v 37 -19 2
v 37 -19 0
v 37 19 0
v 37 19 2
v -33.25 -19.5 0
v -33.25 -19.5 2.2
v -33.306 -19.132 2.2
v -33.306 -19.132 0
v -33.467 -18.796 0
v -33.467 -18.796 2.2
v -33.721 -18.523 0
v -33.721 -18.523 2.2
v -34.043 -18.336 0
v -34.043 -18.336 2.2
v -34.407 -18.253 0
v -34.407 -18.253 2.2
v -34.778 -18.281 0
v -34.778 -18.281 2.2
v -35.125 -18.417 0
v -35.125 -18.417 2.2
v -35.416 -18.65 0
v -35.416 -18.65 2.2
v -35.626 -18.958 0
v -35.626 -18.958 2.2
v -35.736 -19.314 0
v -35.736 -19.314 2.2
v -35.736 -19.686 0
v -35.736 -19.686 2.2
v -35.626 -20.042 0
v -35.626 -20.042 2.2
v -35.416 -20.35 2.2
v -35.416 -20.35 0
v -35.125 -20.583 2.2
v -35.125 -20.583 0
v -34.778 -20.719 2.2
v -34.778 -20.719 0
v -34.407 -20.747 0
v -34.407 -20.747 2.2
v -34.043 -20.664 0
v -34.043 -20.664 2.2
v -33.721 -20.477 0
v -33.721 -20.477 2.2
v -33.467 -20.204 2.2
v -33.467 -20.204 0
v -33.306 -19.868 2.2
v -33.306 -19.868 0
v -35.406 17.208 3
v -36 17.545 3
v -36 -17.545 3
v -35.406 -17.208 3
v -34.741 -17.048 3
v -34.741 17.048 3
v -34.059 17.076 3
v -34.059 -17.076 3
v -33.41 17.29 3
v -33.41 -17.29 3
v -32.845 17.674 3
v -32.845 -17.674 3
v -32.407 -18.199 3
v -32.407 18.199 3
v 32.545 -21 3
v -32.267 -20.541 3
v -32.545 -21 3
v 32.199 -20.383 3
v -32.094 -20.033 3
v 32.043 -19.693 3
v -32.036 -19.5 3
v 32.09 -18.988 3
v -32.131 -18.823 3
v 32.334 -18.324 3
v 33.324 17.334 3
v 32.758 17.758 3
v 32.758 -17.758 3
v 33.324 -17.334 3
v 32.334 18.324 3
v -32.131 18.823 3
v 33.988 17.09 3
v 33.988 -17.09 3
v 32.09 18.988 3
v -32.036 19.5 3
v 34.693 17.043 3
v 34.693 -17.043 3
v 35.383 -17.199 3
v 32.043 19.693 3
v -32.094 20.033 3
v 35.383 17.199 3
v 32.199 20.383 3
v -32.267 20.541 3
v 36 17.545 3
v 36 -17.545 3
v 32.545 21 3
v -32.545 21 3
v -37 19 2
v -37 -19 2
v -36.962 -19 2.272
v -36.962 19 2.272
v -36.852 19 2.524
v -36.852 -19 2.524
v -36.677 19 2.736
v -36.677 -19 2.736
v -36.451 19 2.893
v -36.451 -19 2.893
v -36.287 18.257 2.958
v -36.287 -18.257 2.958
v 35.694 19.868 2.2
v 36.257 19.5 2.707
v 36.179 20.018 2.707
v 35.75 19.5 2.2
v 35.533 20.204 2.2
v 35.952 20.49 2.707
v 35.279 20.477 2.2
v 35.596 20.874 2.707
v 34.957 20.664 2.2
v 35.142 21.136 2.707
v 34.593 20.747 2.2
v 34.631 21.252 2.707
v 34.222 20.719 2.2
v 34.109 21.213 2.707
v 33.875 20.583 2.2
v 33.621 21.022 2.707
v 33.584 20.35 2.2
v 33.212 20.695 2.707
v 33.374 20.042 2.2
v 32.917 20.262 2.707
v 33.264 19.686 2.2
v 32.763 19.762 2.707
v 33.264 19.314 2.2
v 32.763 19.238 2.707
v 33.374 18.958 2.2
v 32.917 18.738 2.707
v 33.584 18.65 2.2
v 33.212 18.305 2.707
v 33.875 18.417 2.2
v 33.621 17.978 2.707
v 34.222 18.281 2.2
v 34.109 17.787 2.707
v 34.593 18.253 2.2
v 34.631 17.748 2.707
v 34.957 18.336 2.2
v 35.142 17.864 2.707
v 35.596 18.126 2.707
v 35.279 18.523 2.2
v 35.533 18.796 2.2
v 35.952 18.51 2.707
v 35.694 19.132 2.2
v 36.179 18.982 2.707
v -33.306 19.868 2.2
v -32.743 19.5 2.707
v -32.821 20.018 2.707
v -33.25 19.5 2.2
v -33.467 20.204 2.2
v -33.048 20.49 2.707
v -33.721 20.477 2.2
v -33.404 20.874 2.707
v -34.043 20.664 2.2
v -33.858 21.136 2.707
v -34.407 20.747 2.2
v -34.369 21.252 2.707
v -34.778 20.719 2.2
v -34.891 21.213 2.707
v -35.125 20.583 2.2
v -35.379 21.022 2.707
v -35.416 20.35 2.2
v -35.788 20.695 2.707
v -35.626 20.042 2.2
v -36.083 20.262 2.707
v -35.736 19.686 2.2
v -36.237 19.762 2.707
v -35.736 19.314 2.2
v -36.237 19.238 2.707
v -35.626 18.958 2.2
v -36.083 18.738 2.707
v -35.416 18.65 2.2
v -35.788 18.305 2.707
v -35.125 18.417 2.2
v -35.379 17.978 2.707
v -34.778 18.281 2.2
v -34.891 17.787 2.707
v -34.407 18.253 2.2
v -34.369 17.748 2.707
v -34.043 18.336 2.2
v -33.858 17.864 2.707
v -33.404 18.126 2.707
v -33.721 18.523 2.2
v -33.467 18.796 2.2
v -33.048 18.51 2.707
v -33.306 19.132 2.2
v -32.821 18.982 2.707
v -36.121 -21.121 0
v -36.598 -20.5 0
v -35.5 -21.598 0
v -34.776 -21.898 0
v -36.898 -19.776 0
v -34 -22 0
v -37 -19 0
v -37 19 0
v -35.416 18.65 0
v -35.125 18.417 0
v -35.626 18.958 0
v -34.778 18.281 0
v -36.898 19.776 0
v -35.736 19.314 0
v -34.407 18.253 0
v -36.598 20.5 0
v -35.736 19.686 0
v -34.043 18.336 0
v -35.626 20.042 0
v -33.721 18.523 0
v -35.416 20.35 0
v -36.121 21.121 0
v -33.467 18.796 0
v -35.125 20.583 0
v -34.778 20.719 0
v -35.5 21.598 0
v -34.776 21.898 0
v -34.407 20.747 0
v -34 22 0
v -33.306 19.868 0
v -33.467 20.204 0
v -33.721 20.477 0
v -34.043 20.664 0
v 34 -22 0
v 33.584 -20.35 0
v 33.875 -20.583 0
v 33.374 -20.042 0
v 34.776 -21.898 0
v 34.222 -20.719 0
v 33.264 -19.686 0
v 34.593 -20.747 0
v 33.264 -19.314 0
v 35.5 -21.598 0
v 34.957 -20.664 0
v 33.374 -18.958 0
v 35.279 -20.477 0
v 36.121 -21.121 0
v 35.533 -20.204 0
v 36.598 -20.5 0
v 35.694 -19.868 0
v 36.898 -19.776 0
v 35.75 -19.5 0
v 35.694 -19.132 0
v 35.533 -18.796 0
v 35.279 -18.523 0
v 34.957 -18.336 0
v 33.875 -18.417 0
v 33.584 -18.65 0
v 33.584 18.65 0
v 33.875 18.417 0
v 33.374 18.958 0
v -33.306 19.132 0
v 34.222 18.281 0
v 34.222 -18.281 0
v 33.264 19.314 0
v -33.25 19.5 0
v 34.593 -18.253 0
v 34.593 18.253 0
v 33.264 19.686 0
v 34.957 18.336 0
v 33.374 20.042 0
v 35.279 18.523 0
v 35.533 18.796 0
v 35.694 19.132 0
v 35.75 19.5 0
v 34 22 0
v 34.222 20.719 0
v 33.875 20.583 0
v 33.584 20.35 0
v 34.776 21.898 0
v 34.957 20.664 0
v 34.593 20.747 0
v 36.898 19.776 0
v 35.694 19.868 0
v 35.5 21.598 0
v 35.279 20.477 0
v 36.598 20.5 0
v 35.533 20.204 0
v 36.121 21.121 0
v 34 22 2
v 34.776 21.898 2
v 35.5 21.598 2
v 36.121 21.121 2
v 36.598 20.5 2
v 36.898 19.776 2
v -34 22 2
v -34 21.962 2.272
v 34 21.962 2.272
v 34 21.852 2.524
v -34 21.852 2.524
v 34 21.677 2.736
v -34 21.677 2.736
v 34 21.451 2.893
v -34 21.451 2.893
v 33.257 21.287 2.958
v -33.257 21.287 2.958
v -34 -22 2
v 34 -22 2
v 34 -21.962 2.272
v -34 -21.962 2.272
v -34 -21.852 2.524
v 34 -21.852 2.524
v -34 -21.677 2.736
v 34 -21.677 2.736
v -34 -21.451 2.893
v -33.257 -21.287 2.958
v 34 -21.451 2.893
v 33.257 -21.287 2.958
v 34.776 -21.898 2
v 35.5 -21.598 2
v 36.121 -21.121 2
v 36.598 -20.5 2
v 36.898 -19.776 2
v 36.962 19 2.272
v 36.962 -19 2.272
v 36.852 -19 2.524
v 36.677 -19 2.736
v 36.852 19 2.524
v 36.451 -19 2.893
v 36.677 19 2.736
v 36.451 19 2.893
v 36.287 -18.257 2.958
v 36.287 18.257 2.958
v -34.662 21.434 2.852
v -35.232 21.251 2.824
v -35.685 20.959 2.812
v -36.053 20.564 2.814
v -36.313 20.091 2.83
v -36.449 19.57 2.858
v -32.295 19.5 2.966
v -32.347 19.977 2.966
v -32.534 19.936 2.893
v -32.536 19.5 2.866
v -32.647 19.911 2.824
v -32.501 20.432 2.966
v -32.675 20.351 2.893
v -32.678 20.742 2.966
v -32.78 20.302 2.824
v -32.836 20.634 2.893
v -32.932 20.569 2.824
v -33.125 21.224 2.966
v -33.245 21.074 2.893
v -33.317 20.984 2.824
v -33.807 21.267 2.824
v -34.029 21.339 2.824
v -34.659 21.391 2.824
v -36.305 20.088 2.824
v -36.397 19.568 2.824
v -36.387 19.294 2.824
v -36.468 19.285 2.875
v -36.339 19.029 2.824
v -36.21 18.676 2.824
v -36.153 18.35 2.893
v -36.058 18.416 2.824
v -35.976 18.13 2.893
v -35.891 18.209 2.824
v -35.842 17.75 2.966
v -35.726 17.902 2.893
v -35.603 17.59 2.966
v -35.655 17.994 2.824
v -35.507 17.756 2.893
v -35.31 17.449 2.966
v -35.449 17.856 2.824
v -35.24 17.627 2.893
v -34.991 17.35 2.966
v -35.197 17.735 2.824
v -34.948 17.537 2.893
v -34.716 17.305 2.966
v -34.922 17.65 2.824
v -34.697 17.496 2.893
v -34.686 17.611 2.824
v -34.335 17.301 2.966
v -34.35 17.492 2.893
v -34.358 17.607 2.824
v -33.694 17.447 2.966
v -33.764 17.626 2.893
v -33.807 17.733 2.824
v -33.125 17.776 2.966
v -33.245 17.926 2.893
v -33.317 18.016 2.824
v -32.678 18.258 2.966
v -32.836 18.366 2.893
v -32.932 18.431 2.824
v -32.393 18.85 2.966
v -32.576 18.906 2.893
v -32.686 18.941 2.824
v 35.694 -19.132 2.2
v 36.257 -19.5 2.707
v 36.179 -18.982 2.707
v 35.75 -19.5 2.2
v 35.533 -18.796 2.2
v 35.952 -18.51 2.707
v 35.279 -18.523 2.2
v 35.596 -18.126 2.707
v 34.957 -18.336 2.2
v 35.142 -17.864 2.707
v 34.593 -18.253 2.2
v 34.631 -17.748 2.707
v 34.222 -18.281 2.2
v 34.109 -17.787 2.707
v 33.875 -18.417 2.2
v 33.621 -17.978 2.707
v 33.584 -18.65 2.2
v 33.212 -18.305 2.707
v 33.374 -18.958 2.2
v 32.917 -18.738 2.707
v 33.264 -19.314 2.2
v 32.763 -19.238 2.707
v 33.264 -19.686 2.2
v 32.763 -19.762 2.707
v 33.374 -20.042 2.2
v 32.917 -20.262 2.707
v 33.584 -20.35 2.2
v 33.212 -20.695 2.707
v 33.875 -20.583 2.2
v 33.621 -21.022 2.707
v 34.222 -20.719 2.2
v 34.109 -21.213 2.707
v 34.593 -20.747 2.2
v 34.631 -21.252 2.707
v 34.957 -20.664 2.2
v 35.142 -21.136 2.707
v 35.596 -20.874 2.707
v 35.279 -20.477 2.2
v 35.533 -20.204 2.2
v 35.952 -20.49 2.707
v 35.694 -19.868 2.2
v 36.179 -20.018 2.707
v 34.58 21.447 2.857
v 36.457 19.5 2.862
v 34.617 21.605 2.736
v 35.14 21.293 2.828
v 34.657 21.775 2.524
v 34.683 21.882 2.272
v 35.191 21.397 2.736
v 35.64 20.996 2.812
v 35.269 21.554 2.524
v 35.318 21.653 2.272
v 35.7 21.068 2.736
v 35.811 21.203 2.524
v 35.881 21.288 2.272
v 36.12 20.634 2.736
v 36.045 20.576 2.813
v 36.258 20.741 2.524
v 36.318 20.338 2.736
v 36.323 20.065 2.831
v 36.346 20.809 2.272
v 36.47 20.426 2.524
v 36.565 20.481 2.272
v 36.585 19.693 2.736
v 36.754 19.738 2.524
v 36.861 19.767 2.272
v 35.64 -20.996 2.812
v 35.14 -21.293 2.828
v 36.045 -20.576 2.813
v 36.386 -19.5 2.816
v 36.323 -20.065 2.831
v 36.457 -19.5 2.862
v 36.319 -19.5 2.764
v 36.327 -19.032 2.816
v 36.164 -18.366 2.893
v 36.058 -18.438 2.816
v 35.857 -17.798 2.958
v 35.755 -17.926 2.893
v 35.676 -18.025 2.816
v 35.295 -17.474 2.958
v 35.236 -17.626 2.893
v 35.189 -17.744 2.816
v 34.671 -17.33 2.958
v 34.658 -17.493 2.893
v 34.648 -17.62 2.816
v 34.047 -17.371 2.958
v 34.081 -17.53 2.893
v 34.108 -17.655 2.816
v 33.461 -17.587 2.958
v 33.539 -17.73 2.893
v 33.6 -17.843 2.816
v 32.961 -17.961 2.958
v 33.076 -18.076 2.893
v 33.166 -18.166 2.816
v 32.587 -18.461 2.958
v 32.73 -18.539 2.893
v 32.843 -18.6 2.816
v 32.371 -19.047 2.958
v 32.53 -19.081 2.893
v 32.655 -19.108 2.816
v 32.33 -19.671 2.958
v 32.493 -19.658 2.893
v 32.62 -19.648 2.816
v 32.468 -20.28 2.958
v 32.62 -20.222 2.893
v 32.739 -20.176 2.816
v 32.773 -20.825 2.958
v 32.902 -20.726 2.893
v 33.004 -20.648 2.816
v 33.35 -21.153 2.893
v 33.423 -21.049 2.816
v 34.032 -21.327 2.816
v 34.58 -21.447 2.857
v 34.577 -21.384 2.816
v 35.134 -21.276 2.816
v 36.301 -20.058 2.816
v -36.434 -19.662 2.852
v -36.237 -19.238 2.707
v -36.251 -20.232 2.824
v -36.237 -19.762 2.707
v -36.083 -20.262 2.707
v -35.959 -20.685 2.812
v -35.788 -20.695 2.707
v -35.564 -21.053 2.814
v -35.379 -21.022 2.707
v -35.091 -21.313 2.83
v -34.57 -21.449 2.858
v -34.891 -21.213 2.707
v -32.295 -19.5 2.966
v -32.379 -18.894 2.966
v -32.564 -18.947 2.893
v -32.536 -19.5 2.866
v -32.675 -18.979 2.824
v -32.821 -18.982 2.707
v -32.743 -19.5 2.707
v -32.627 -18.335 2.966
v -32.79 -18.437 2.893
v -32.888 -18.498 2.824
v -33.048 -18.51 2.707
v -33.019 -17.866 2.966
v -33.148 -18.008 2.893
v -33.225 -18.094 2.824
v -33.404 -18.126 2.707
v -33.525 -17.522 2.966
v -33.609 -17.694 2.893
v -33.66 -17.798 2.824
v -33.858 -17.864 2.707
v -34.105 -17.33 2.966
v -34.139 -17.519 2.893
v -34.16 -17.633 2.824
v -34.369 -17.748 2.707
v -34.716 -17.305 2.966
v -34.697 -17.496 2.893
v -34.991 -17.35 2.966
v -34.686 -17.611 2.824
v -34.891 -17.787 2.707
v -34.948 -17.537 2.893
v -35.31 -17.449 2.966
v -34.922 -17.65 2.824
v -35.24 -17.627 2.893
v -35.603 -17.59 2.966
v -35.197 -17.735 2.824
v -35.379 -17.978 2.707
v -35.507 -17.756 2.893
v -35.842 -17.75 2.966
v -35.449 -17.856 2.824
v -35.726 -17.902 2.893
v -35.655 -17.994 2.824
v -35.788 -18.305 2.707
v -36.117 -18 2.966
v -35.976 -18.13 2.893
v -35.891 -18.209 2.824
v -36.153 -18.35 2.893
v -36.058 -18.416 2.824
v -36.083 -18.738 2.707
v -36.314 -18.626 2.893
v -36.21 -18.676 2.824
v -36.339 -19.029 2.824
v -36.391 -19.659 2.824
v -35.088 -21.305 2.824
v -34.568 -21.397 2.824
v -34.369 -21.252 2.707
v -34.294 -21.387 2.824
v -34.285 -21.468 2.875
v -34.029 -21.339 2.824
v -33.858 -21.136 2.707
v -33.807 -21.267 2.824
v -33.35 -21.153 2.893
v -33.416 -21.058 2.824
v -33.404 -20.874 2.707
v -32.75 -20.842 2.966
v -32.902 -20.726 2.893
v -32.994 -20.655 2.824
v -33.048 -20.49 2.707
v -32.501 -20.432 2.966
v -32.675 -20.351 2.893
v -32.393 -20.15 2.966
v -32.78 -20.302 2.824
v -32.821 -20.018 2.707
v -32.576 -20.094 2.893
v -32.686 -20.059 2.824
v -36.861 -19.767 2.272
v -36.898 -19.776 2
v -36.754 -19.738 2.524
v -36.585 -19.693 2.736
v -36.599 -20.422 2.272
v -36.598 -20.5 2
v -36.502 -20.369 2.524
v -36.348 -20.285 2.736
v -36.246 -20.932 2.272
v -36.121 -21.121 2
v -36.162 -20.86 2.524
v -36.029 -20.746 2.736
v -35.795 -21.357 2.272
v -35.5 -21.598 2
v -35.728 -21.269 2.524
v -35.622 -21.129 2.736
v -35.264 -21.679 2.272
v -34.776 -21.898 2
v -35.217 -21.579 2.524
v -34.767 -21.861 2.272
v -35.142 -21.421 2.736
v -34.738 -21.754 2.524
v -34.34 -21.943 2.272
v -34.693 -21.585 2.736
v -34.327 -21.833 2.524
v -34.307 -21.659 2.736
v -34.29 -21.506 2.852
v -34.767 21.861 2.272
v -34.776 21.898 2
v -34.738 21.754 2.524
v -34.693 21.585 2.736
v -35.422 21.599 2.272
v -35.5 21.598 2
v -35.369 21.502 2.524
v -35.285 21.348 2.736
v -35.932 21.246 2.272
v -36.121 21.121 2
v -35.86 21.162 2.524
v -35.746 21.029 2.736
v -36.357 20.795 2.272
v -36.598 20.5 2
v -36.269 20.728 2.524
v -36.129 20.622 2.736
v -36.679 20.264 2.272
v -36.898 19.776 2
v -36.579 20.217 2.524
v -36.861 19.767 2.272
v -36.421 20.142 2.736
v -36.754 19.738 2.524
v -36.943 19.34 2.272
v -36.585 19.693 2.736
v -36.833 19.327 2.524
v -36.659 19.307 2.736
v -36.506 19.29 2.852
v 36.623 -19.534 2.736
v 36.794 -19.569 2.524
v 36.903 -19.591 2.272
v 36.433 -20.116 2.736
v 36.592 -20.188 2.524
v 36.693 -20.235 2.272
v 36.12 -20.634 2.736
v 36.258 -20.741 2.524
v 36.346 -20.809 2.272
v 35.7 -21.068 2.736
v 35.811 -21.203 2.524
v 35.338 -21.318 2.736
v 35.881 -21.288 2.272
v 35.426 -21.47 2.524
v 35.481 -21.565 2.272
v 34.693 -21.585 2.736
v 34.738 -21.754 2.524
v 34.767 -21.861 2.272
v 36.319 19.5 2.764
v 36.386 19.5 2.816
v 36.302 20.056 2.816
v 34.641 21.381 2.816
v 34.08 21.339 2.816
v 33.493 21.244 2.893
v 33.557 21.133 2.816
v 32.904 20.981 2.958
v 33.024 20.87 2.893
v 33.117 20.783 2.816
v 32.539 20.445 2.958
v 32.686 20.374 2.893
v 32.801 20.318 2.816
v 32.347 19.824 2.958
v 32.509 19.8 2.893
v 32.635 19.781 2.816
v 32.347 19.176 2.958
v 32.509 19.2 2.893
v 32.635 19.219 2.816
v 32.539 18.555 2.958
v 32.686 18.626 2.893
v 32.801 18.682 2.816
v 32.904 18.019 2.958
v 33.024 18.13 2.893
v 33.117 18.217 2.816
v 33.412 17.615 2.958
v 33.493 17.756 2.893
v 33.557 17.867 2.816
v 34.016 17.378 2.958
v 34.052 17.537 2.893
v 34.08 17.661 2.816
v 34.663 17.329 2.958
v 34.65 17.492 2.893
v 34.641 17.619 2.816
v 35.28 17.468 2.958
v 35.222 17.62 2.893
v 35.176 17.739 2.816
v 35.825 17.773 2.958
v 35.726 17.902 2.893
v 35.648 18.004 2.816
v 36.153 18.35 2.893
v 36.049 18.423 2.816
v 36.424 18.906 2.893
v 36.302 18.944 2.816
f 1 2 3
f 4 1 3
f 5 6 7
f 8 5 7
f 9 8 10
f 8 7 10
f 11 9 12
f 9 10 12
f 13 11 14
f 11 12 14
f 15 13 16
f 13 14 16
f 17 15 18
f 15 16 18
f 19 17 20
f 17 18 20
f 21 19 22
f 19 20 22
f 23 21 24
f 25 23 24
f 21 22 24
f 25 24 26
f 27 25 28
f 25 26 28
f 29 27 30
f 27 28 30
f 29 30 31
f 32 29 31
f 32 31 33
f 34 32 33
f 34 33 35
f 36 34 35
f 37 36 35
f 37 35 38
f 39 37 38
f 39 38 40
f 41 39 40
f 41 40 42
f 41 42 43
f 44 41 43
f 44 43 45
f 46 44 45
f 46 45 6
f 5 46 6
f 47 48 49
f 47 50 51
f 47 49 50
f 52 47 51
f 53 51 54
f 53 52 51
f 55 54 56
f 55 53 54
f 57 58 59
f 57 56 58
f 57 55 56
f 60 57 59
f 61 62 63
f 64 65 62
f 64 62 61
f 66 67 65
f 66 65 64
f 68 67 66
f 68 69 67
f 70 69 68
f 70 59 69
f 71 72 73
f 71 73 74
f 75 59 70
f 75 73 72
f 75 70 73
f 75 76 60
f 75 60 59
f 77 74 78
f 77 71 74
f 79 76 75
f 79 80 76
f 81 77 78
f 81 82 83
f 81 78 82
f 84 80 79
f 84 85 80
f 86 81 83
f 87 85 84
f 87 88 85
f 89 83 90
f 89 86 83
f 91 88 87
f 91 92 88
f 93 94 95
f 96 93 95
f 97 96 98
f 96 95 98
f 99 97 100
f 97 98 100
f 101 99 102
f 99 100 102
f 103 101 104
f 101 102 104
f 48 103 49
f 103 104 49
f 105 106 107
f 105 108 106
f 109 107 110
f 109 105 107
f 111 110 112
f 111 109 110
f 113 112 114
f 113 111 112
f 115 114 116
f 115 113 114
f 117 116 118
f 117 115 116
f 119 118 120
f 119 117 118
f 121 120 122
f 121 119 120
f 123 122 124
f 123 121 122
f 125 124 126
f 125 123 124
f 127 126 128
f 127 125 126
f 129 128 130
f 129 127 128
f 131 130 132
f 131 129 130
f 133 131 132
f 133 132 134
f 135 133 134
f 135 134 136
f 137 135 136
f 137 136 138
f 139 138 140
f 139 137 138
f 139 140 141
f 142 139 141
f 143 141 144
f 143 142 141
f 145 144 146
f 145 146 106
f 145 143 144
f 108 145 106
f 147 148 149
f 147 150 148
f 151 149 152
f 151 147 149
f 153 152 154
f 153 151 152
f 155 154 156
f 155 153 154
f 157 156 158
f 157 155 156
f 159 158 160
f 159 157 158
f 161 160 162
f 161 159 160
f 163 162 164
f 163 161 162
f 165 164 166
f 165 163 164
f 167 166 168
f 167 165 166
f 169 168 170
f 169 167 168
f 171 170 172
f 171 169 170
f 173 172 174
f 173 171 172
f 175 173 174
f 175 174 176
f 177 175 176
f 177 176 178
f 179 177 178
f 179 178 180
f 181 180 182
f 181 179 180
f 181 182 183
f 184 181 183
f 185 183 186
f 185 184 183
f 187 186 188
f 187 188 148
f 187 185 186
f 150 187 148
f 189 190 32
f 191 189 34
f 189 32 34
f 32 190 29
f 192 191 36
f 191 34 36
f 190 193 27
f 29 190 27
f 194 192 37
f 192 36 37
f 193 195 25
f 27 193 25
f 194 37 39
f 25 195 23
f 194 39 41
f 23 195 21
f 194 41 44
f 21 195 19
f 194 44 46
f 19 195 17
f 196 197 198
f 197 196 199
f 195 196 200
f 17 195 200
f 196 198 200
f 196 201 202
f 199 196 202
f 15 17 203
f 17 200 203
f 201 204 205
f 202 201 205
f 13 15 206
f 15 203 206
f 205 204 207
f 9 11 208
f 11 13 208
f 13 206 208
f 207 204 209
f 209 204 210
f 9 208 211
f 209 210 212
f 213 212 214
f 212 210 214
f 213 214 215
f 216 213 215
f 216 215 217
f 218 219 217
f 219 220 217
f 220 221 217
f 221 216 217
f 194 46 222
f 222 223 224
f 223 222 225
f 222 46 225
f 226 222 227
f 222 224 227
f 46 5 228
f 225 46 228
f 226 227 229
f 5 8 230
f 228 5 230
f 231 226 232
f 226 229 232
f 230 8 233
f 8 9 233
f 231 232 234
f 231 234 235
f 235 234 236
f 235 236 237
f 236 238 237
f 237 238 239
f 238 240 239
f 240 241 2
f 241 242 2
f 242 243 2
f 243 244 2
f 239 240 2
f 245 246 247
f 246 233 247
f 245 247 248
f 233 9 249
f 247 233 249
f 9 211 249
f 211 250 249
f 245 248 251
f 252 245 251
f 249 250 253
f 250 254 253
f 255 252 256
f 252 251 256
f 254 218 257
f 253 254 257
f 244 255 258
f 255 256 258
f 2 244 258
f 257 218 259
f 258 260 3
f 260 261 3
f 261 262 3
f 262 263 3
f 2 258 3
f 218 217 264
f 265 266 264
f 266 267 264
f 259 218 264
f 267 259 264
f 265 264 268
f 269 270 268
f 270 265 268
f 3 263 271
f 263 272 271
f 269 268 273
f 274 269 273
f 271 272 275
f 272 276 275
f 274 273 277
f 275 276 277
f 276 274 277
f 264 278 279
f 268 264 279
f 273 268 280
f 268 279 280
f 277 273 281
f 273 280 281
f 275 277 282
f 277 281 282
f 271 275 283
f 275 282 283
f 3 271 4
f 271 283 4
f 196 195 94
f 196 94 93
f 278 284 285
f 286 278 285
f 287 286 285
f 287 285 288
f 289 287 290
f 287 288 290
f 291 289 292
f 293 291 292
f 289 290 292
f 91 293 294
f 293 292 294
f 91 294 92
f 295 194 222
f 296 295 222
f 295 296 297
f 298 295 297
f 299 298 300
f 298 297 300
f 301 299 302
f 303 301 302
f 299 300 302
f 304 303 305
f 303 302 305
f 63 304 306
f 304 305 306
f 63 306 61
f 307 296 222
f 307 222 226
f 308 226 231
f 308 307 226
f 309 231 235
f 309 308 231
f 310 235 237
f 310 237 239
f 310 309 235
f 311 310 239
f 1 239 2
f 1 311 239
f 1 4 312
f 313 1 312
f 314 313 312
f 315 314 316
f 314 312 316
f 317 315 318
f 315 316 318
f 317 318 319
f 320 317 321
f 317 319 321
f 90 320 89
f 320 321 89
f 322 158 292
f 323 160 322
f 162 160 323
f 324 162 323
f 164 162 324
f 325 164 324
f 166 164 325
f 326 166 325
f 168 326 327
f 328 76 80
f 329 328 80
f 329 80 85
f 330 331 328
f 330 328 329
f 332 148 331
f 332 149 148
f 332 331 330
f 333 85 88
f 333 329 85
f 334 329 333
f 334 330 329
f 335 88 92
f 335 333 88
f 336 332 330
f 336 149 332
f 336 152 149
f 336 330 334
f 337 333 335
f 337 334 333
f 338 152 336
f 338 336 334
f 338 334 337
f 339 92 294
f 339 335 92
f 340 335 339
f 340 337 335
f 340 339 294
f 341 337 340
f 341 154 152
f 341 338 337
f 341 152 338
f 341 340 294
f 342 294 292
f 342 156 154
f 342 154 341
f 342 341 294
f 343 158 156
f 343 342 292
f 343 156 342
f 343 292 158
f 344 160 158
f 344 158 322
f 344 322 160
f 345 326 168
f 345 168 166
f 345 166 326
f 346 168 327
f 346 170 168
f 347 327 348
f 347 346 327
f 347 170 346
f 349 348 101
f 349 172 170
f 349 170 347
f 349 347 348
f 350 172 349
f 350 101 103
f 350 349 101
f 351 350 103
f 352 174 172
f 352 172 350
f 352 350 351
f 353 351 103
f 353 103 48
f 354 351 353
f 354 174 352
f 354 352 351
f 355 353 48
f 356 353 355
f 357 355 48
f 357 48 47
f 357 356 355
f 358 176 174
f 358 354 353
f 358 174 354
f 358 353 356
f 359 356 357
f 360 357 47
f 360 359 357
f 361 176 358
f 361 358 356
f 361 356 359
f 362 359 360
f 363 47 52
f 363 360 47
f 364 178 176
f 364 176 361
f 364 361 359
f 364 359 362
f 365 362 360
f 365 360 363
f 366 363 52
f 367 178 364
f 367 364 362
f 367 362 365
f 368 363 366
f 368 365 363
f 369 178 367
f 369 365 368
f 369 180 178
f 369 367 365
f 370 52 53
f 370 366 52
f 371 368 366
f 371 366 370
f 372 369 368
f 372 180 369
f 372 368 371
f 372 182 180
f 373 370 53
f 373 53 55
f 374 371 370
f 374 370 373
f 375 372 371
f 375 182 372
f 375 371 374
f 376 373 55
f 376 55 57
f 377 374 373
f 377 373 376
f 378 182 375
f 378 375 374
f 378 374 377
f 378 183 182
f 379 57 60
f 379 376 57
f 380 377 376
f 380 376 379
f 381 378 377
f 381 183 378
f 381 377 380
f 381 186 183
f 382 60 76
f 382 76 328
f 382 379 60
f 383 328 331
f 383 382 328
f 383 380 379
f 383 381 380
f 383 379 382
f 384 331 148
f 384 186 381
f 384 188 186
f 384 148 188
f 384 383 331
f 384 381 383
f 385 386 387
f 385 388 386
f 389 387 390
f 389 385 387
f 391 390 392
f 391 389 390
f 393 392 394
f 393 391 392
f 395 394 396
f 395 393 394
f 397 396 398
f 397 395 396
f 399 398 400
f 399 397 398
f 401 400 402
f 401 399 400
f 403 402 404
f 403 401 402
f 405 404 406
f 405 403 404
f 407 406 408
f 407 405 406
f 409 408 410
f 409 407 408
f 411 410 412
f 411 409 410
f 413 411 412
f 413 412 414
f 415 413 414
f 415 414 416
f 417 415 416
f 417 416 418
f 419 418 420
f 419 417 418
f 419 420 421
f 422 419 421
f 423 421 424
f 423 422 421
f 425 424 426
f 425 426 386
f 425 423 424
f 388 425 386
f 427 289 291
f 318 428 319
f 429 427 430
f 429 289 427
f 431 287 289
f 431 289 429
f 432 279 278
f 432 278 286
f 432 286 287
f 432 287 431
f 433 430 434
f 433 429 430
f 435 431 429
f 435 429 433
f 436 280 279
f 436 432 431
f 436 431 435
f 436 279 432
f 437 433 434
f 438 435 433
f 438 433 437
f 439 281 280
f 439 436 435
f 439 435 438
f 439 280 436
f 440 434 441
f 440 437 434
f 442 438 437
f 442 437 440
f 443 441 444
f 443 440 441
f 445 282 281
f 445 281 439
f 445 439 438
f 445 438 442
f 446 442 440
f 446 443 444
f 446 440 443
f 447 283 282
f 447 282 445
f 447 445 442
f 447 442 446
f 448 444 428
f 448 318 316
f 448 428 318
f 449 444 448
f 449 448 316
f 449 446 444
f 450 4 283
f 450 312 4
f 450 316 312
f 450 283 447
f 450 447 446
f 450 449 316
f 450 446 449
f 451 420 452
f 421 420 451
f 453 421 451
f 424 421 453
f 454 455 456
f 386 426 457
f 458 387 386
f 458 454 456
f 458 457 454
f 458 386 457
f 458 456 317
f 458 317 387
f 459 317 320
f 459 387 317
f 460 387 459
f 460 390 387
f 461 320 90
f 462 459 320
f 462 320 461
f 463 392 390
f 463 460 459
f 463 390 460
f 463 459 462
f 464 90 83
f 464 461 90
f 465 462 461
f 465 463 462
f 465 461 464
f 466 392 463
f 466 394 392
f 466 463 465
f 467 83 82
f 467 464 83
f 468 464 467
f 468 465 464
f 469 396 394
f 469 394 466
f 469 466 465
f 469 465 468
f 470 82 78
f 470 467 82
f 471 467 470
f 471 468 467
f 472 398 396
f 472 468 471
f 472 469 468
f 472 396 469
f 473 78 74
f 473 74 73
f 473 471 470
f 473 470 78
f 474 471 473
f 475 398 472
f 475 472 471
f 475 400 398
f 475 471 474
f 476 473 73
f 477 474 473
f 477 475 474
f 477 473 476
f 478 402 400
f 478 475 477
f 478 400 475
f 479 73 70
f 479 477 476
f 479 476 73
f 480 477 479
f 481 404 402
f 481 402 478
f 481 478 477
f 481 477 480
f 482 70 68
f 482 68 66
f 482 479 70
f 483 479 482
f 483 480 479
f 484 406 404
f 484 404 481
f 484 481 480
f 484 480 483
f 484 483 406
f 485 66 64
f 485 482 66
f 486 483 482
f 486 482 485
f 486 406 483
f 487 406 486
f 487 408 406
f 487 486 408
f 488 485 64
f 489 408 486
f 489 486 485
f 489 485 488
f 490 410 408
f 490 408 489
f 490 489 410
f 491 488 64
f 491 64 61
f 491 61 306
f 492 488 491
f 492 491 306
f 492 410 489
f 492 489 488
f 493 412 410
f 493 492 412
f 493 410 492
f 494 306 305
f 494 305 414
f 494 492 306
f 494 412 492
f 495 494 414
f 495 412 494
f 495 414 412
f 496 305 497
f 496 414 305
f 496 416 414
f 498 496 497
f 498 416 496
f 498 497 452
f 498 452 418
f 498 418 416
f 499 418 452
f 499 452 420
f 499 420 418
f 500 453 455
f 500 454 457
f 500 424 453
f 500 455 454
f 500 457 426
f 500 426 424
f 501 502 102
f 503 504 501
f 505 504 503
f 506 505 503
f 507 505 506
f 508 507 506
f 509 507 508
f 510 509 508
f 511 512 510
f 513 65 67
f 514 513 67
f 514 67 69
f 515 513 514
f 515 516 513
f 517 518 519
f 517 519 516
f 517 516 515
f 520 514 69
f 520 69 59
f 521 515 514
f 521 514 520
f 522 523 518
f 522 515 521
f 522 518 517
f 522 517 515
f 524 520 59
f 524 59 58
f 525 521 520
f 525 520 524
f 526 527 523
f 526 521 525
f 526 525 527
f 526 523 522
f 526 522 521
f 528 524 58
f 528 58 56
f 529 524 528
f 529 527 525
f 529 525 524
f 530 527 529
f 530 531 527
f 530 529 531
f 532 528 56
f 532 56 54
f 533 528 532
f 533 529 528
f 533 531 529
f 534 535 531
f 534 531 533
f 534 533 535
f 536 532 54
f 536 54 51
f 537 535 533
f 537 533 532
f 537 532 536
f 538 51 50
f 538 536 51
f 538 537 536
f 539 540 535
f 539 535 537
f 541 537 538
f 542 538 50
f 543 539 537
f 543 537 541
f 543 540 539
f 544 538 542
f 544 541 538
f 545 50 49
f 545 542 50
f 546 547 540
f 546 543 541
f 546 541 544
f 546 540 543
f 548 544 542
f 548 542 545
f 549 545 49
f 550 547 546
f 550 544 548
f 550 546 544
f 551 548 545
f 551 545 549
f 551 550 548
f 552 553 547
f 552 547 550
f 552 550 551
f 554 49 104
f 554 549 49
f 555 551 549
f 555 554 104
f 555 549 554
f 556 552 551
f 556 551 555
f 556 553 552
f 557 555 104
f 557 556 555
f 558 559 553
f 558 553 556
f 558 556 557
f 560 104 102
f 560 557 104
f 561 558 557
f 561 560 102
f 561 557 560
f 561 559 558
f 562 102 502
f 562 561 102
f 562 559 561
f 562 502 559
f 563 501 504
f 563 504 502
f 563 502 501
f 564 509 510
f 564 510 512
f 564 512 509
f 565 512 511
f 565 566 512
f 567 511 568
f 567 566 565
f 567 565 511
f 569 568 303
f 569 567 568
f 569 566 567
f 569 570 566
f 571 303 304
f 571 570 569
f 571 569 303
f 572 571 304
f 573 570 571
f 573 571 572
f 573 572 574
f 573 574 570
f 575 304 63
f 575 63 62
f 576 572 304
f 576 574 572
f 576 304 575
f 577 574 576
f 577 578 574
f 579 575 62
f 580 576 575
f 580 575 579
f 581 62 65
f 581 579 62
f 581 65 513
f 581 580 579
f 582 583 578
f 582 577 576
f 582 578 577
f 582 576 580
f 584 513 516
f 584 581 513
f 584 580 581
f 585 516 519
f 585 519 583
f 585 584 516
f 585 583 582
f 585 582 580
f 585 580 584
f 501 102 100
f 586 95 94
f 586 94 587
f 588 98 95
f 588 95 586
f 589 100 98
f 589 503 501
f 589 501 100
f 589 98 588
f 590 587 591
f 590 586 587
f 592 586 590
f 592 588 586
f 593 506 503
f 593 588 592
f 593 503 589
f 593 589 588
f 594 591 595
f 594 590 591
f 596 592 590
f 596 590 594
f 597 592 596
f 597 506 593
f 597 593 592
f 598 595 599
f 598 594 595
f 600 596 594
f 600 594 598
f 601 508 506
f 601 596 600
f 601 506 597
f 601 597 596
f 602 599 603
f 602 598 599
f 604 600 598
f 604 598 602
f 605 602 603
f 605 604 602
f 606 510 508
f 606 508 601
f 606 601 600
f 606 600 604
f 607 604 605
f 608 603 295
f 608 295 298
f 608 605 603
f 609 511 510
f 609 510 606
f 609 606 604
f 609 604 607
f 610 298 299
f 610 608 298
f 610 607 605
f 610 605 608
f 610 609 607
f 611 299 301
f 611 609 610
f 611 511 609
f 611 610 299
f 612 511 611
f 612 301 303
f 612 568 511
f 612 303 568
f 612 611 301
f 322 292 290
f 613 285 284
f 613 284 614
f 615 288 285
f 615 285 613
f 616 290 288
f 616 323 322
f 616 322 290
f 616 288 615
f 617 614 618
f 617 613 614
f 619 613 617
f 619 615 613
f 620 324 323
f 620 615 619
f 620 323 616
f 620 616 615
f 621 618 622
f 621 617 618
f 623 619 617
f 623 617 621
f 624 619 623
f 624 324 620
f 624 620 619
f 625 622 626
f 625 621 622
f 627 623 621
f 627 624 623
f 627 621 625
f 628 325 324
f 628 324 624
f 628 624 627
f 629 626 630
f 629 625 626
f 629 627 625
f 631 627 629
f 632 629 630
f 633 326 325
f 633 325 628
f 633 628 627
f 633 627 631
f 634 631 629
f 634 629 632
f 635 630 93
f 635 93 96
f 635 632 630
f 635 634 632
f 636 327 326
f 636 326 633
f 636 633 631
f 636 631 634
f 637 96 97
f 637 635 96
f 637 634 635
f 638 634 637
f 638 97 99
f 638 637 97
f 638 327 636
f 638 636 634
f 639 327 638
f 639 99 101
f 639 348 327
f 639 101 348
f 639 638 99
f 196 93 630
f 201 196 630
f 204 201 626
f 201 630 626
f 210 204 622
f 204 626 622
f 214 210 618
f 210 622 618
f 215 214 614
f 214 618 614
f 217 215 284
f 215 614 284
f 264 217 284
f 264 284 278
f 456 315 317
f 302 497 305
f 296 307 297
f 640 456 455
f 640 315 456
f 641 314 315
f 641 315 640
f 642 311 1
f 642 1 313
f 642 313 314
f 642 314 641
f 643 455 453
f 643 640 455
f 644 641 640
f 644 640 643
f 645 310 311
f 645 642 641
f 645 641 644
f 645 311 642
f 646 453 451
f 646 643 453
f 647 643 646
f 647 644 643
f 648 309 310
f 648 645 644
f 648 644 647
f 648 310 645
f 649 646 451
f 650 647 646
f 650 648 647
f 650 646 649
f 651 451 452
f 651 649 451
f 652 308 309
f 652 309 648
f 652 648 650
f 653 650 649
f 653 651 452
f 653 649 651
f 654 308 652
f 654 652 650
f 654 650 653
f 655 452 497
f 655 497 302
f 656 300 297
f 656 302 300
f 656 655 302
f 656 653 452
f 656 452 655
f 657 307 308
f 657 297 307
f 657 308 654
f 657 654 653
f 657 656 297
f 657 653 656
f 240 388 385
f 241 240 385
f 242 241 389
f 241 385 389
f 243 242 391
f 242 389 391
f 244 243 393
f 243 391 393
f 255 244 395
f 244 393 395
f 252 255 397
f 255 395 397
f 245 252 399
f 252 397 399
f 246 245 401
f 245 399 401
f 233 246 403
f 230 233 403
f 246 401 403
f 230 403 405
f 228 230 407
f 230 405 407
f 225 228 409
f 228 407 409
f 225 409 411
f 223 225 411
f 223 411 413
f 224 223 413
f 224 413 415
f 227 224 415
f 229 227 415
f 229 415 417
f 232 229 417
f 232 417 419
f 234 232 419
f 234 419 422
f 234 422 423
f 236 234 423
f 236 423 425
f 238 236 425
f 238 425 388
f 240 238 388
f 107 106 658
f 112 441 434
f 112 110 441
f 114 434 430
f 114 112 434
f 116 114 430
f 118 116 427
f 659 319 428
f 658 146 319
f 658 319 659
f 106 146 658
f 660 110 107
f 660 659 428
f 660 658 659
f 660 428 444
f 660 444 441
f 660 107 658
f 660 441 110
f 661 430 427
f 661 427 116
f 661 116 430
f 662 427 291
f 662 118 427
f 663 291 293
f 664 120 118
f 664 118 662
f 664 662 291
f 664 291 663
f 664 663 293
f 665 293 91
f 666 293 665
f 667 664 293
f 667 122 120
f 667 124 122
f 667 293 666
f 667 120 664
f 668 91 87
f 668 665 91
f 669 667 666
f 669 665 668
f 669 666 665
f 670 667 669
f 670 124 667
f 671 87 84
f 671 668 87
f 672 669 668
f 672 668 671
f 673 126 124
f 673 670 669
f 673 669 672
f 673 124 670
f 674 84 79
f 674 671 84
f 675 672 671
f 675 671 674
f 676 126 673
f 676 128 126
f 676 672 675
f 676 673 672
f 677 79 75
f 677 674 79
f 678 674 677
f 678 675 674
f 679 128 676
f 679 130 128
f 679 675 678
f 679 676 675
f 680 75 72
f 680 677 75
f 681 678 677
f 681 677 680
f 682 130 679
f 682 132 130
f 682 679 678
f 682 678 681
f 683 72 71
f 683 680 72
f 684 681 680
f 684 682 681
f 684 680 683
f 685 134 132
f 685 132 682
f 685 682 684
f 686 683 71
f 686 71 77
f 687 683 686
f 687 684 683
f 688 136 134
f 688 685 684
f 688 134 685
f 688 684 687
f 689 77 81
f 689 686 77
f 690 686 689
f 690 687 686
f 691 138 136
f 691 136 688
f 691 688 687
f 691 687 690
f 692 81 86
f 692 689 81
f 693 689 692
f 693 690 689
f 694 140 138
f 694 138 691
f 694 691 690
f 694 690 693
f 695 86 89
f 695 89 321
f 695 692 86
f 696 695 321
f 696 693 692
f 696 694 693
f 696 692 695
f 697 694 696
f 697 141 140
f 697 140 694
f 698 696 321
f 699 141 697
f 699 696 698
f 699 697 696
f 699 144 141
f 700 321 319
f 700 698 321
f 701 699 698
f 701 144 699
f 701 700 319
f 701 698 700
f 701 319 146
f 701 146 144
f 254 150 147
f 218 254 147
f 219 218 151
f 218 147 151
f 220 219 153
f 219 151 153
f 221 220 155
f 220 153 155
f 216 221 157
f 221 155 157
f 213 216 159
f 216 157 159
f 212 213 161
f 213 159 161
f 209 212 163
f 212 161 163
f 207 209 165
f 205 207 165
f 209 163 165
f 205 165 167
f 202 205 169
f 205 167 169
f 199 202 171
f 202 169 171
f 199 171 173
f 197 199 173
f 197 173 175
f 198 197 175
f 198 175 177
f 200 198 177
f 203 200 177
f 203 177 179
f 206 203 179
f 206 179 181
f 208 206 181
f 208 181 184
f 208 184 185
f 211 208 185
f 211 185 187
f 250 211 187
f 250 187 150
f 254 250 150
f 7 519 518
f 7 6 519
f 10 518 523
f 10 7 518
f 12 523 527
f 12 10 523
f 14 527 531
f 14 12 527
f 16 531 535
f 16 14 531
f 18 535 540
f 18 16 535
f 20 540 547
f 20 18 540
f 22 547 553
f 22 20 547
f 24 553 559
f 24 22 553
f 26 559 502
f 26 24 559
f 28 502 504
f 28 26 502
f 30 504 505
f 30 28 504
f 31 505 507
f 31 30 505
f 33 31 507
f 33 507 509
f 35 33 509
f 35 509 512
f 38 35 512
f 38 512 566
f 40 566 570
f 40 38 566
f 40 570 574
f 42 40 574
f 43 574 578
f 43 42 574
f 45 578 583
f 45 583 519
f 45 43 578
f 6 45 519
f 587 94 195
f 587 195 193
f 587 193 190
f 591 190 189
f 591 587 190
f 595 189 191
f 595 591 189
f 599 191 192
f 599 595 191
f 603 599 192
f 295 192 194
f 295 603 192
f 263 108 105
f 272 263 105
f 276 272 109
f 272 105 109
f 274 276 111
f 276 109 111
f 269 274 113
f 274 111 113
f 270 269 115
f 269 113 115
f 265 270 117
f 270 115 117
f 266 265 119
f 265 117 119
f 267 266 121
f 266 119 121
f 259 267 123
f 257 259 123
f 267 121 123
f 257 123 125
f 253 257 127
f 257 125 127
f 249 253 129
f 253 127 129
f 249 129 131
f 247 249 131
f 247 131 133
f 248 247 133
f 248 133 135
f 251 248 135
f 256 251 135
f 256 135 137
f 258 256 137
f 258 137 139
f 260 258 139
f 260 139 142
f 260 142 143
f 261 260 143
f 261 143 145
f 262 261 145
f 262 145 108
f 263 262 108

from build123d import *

# Parameters (mm, degrees)
IZIM1_W                     = 74
IZIM1_H                     = 44
Y_KSEKLIK_EKSTR_ZYON1_DEPTH = 3
IZIM2_R                     = 1.25
KES_EKSTR_ZYON1_DEPTH       = 44.150898021
RADYUS1_R                   = 3
PAH1_SIZE                   = 0.8
RADYUS2_R                   = 1


with BuildPart() as part:
    # Çizim1 → Yükseklik-Ekstrüzyon1 (new body)
    with BuildSketch(Plane.XY):
        Rectangle(IZIM1_W, IZIM1_H)
    extrude(amount=Y_KSEKLIK_EKSTR_ZYON1_DEPTH)

    # Çizim2 → Kes-Ekstrüzyon1 (cut, through all)
    with BuildSketch(Plane.XY.offset(3)):
        with Locations((-34.5, 19.5)):
            Circle(IZIM2_R)
        with Locations((-34.5, -19.5)):
            Circle(IZIM2_R)
        with Locations((34.5, 19.5)):
            Circle(IZIM2_R)
        with Locations((34.5, -19.5)):
            Circle(IZIM2_R)
    extrude(amount=-KES_EKSTR_ZYON1_DEPTH, mode=Mode.SUBTRACT)

    # Radyus1
    radyus1_edges = [part.edges().sort_by_distance(p)[0] for p in [
        (37, -22, 1.5),
        (-37, -22, 1.5),
        (-37, 22, 1.5),
        (37, 22, 1.5),
    ]]
    fillet(radyus1_edges, radius=RADYUS1_R)

    # Pah1
    pah1_edges = [part.edges().sort_by_distance(p)[0] for p in [
        (-35.75, -19.5, 3),
        (33.25, 19.5, 3),
        (33.25, -19.5, 3),
        (-35.75, 19.5, 3),
    ]]
    chamfer(pah1_edges, length=PAH1_SIZE)

    # Radyus2
    # the kernel refuses this fillet: 1 mm, written as the material it takes off along each edge
    with BuildSketch(Plane(origin=(34, -22, 3), x_dir=(0, 1, 0), z_dir=(-1, 0, 0)), Plane(origin=(-34, 22, 3), x_dir=(0, -1, 0), z_dir=(1, 0, 0))) as radyus2_piece_1:
        with BuildLine():
            CenterArc((RADYUS2_R, RADYUS2_R), RADYUS2_R, 180, 90)
            Line((0, RADYUS2_R), (0, 0))
            Line((0, 0), (RADYUS2_R, 0))
        make_face()
    extrude(amount=68, mode=Mode.SUBTRACT)
    with BuildSketch(Plane(origin=(-37, -19, 3), x_dir=(1, 0, 0), z_dir=(0, 1, 0)), Plane(origin=(37, 19, 3), x_dir=(-1, 0, 0), z_dir=(0, -1, 0))) as radyus2_piece_2:
        with BuildLine():
            CenterArc((RADYUS2_R, RADYUS2_R), RADYUS2_R, 180, 90)
            Line((0, RADYUS2_R), (0, 0))
            Line((0, 0), (RADYUS2_R, 0))
        make_face()
    extrude(amount=38, mode=Mode.SUBTRACT)
    with BuildSketch(Plane(origin=(-34, 19, 3), x_dir=(0, 1, 0), z_dir=(1, 0, 0))) as radyus2_piece_3:
        with BuildLine():
            CenterArc((3 - RADYUS2_R, -RADYUS2_R), RADYUS2_R, 0, 90)
            Line((3, -RADYUS2_R), (3, 0))
            Line((3, 0), (3 - RADYUS2_R, 0))
        make_face()
    revolve(axis=Axis((-34, 19, 3), (0, 0, 1)), revolution_arc=90, mode=Mode.SUBTRACT)
    with BuildSketch(Plane(origin=(34, 19, 3), x_dir=(0, 1, 0), z_dir=(-1, 0, 0))) as radyus2_piece_4:
        with BuildLine():
            CenterArc((3 - RADYUS2_R, RADYUS2_R), RADYUS2_R, 270, 90)
            Line((3, RADYUS2_R), (3, 0))
            Line((3, 0), (3 - RADYUS2_R, 0))
        make_face()
    revolve(axis=Axis((34, 19, 3), (0, 0, -1)), revolution_arc=90, mode=Mode.SUBTRACT)
    with BuildSketch(Plane(origin=(34, -19, 3), x_dir=(1, 0, 0), z_dir=(0, 1, 0))) as radyus2_piece_5:
        with BuildLine():
            CenterArc((3 - RADYUS2_R, RADYUS2_R), RADYUS2_R, 270, 90)
            Line((3, RADYUS2_R), (3, 0))
            Line((3, 0), (3 - RADYUS2_R, 0))
        make_face()
    revolve(axis=Axis((34, -19, 3), (0, 0, -1)), revolution_arc=90, mode=Mode.SUBTRACT)
    with BuildSketch(Plane(origin=(-34, -19, 3), x_dir=(-1, 0, 0), z_dir=(0, 1, 0))) as radyus2_piece_6:
        with BuildLine():
            CenterArc((3 - RADYUS2_R, -RADYUS2_R), RADYUS2_R, 0, 90)
            Line((3, -RADYUS2_R), (3, 0))
            Line((3, 0), (3 - RADYUS2_R, 0))
        make_face()
    revolve(axis=Axis((-34, -19, 3), (0, 0, 1)), revolution_arc=90, mode=Mode.SUBTRACT)
    with BuildSketch(Plane(origin=(-34.5, 19.5, 3), x_dir=(1, 0, 0), z_dir=(0, -1, 0))) as radyus2_piece_7:
        with BuildLine():
            CenterArc((2.05 + RADYUS2_R * 0.414213562373, -RADYUS2_R), RADYUS2_R, 90, 45)
            Line((2.05 - RADYUS2_R * 0.292893218813, -RADYUS2_R * 0.292893218813), (2.05, 0))
            Line((2.05, 0), (2.05 + RADYUS2_R * 0.414213562373, 0))
        make_face()
    revolve(axis=Axis((-34.5, 19.5, 3), (0, 0, 1)), mode=Mode.SUBTRACT)
    with BuildSketch(Plane(origin=(-34.5, -19.5, 3), x_dir=(1, 0, 0), z_dir=(0, -1, 0))) as radyus2_piece_8:
        with BuildLine():
            CenterArc((2.05 + RADYUS2_R * 0.414213562373, -RADYUS2_R), RADYUS2_R, 90, 45)
            Line((2.05 - RADYUS2_R * 0.292893218813, -RADYUS2_R * 0.292893218813), (2.05, 0))
            Line((2.05, 0), (2.05 + RADYUS2_R * 0.414213562373, 0))
        make_face()
    revolve(axis=Axis((-34.5, -19.5, 3), (0, 0, 1)), mode=Mode.SUBTRACT)
    with BuildSketch(Plane(origin=(34.5, -19.5, 3), x_dir=(1, 0, 0), z_dir=(0, -1, 0))) as radyus2_piece_9:
        with BuildLine():
            CenterArc((2.05 + RADYUS2_R * 0.414213562373, -RADYUS2_R), RADYUS2_R, 90, 45)
            Line((2.05 - RADYUS2_R * 0.292893218813, -RADYUS2_R * 0.292893218813), (2.05, 0))
            Line((2.05, 0), (2.05 + RADYUS2_R * 0.414213562373, 0))
        make_face()
    revolve(axis=Axis((34.5, -19.5, 3), (0, 0, 1)), mode=Mode.SUBTRACT)
    with BuildSketch(Plane(origin=(34.5, 19.5, 3), x_dir=(1, 0, 0), z_dir=(0, -1, 0))) as radyus2_piece_10:
        with BuildLine():
            CenterArc((2.05 + RADYUS2_R * 0.414213562373, -RADYUS2_R), RADYUS2_R, 90, 45)
            Line((2.05 - RADYUS2_R * 0.292893218813, -RADYUS2_R * 0.292893218813), (2.05, 0))
            Line((2.05, 0), (2.05 + RADYUS2_R * 0.414213562373, 0))
        make_face()
    revolve(axis=Axis((34.5, 19.5, 3), (0, 0, 1)), mode=Mode.SUBTRACT)


solid = part.part
